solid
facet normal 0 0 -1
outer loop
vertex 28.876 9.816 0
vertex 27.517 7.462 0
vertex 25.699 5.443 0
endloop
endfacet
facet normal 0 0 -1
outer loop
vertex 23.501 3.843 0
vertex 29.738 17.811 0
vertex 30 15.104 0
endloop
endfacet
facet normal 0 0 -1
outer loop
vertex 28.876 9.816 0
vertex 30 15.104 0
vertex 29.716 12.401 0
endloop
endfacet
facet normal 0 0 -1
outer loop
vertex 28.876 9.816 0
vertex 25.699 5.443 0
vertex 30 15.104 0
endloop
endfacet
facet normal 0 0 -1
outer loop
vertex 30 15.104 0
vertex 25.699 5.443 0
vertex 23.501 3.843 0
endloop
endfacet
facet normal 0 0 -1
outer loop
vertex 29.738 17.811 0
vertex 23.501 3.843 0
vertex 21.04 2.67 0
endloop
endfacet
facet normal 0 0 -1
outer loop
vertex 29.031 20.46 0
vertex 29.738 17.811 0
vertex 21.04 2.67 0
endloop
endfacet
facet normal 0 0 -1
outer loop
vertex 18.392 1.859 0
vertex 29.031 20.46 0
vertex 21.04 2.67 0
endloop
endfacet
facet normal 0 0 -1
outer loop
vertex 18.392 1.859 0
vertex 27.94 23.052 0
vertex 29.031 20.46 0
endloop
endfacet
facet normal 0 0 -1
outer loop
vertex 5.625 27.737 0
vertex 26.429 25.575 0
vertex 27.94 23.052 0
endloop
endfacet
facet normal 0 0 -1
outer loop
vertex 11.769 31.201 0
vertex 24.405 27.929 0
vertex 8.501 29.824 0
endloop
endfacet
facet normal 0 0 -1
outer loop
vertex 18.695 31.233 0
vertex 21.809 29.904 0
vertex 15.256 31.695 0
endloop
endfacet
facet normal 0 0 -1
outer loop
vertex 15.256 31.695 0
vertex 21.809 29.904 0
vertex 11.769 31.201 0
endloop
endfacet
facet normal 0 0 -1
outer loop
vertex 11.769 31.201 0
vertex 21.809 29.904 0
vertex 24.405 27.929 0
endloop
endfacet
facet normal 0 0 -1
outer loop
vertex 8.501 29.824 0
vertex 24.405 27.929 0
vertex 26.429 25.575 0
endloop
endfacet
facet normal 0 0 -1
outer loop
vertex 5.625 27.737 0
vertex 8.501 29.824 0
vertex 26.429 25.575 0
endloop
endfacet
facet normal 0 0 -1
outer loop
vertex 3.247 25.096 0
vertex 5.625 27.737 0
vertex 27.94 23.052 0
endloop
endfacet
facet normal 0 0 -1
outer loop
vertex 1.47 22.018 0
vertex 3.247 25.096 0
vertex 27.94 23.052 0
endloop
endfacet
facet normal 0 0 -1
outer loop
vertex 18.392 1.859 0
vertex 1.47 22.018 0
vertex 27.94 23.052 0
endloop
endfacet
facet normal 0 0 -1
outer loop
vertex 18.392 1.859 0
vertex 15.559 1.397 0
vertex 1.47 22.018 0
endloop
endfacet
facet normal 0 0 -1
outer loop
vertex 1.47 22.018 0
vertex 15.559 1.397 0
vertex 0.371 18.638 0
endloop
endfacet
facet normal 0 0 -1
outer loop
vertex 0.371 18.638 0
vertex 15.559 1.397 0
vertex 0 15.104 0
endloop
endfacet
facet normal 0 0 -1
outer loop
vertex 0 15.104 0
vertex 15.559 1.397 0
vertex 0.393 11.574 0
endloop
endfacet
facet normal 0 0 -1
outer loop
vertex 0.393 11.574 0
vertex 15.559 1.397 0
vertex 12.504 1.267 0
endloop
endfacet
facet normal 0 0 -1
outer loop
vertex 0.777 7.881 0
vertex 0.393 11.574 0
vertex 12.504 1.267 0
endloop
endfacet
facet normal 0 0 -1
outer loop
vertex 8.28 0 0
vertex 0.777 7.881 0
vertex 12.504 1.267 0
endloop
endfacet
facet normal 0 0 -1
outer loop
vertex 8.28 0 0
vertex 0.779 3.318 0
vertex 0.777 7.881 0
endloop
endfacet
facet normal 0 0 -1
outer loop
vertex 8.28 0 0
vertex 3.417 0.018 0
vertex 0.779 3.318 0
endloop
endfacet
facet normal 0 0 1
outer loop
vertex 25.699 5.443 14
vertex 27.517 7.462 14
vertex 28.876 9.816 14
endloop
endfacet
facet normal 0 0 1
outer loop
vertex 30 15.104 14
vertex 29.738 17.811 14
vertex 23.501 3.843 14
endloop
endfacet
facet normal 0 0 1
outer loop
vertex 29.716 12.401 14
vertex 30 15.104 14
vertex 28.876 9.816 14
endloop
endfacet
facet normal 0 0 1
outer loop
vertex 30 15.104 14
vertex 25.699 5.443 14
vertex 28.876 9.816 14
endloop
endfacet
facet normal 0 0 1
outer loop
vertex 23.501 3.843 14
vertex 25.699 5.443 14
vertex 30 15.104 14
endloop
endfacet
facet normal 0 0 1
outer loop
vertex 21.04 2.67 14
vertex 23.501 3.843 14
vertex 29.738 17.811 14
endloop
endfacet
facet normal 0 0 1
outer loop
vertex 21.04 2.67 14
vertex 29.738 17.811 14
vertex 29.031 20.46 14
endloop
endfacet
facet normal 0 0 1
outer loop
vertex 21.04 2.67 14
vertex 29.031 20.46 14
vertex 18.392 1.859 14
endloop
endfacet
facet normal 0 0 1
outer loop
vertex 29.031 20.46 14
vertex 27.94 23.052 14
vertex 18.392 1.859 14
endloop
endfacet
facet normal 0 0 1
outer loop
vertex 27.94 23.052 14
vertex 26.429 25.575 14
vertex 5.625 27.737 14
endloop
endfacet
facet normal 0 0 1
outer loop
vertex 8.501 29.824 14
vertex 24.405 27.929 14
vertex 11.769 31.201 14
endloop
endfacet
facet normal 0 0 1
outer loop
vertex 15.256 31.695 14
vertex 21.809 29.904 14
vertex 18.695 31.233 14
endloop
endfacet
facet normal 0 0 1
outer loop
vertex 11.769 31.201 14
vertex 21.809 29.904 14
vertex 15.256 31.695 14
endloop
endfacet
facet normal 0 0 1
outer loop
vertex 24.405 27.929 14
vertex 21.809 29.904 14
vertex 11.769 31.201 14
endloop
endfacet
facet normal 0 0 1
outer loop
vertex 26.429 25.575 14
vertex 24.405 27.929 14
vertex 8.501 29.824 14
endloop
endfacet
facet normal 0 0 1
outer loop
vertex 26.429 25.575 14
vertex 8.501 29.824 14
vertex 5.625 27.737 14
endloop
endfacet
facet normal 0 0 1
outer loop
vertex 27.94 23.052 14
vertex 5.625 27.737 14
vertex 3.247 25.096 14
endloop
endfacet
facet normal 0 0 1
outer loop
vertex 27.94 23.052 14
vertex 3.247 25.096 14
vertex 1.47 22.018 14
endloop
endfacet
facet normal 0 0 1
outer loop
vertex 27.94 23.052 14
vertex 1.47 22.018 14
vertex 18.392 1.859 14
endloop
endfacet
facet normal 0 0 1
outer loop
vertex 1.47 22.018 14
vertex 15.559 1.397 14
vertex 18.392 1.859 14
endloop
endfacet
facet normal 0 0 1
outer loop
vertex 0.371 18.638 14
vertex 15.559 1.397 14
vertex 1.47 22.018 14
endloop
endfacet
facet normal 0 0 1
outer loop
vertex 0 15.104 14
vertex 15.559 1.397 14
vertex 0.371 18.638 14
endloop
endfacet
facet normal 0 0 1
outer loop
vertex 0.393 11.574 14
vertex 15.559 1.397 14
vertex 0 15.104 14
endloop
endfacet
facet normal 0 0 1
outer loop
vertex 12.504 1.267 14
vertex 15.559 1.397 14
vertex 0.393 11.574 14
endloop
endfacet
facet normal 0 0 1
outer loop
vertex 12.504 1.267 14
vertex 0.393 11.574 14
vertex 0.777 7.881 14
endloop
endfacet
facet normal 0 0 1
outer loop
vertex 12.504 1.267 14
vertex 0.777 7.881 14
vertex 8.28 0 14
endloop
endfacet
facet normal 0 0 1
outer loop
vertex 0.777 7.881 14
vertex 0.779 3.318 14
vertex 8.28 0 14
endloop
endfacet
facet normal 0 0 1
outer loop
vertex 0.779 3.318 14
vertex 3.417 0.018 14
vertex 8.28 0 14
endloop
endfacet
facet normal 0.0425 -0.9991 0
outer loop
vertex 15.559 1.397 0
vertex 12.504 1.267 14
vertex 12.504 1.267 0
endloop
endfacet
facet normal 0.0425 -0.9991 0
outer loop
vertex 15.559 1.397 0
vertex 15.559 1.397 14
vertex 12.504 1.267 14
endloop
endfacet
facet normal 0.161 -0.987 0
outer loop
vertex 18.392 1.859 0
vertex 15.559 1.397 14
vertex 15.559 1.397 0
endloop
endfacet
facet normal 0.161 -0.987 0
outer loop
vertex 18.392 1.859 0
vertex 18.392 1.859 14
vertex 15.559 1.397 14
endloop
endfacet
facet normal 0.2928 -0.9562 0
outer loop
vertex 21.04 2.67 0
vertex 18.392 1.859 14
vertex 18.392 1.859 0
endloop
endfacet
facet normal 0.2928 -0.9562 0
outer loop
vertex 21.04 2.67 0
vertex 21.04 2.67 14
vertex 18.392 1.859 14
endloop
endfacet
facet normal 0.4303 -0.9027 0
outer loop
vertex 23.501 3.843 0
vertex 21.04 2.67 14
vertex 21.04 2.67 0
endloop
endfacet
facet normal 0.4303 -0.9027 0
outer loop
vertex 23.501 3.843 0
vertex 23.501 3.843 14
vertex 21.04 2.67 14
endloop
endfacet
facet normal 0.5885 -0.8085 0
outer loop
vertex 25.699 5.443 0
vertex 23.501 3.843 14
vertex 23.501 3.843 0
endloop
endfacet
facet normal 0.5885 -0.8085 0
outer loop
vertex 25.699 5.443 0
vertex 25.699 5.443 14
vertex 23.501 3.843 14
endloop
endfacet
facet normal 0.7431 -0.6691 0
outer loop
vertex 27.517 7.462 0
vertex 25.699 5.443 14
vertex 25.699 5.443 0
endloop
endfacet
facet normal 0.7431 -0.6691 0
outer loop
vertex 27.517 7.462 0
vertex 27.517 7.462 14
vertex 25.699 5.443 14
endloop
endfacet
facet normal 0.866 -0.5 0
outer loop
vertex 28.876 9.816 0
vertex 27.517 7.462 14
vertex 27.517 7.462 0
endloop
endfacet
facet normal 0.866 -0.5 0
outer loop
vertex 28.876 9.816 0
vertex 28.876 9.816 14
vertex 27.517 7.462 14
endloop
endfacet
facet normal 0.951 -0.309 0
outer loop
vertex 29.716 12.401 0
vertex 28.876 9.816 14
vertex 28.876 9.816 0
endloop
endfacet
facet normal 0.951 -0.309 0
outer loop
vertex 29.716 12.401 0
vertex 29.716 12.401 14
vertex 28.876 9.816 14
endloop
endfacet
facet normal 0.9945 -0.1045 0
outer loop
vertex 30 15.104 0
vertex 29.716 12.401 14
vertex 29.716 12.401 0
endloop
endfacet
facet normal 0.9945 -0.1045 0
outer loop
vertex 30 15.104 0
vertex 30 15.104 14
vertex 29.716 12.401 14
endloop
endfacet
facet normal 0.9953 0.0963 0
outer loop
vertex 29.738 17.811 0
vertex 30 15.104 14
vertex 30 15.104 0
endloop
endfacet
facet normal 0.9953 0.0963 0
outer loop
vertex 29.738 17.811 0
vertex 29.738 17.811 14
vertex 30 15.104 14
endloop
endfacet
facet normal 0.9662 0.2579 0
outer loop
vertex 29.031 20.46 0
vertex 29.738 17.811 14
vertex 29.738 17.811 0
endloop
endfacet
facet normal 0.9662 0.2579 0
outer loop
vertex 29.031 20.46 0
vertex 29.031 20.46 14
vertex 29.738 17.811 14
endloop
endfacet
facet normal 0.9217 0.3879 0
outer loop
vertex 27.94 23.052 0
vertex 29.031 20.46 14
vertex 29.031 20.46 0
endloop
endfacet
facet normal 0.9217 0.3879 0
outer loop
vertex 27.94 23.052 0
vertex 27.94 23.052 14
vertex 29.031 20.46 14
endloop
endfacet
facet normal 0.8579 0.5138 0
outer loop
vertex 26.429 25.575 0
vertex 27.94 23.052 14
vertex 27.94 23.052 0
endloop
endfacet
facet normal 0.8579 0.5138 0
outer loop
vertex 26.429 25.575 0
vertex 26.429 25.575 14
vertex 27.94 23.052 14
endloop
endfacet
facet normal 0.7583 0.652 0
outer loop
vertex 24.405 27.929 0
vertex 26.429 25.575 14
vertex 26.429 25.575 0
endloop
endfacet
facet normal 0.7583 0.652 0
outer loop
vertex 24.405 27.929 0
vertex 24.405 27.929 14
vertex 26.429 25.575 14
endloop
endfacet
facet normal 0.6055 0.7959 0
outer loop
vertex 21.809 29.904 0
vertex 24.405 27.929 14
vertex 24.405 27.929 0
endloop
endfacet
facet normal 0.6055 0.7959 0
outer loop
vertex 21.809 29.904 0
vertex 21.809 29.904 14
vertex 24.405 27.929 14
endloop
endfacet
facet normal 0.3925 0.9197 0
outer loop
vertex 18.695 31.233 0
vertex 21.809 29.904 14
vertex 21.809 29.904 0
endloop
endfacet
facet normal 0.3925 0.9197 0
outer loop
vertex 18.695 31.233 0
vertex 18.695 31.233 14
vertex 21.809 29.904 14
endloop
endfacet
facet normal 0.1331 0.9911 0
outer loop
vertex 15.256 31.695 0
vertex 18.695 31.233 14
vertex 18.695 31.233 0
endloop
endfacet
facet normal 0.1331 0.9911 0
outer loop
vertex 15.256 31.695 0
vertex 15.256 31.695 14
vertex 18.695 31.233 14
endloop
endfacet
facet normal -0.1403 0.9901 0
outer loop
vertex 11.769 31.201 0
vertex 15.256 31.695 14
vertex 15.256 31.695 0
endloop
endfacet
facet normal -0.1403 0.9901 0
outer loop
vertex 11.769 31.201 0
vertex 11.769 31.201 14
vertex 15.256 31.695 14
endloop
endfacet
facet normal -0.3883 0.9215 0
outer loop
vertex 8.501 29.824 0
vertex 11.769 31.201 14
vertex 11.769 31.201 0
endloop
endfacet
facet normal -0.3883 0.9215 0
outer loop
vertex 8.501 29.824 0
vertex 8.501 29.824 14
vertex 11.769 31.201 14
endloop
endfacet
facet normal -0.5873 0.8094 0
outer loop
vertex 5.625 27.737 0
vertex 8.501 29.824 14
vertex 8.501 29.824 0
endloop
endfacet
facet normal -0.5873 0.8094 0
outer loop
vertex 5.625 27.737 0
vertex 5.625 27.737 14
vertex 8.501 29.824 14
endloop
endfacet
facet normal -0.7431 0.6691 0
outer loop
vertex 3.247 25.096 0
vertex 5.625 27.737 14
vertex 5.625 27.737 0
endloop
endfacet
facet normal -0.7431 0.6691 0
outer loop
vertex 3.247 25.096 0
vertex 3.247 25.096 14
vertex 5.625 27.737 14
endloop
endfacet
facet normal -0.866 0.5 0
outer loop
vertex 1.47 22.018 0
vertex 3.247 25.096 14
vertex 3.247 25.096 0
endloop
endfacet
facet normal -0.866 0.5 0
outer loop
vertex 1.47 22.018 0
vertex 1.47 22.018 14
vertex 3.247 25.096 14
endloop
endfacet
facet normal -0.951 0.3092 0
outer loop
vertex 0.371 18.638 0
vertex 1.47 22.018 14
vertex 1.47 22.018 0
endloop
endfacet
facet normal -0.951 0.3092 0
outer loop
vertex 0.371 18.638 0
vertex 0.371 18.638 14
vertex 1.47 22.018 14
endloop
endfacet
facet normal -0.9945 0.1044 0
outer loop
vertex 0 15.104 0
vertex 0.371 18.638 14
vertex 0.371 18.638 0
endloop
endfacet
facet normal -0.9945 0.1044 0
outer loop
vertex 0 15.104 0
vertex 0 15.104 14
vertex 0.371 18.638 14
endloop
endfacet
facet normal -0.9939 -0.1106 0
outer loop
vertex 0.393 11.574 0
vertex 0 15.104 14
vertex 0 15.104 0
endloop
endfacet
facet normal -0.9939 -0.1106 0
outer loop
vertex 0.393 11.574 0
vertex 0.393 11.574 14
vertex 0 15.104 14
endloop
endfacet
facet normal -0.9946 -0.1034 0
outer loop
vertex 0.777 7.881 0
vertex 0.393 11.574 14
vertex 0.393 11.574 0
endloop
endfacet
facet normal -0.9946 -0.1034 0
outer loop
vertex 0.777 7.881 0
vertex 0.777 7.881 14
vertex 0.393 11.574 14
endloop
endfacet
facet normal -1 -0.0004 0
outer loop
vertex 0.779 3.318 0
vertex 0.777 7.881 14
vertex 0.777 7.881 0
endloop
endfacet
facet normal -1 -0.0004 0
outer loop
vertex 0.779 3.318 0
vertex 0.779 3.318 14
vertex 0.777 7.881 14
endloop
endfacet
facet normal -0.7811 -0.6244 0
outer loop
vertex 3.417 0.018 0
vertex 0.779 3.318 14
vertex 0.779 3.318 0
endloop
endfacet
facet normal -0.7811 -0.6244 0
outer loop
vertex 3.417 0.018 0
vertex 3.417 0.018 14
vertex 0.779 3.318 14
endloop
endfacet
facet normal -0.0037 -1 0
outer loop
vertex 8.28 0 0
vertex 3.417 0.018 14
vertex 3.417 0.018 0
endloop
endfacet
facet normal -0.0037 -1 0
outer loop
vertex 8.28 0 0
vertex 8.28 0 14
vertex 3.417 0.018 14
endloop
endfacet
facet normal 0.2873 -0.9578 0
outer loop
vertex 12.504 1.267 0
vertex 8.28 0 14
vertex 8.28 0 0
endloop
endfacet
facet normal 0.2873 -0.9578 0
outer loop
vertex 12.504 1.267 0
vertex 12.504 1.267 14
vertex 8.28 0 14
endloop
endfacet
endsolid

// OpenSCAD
$fn = 32;

// ----------------------------------------------------------------------
// Cam disc: base radius 13.0 mm, lift 4.0 mm, 30 profile points
// ----------------------------------------------------------------------

// --- parameters (mm) ---
profile_height = 14;      // extrusion height
profile_points = 30;      // points of the closed outline

profile = [[30, 15.104], [29.738, 17.811], [29.031, 20.46], [27.94, 23.052], [26.429, 25.575], [24.405, 27.929], [21.809, 29.904], [18.695, 31.233], [15.256, 31.695], [11.769, 31.201], [8.501, 29.824], [5.625, 27.737], [3.247, 25.096], [1.47, 22.018], [0.371, 18.638], [0, 15.104], [0.393, 11.574], [0.777, 7.881], [0.779, 3.318], [3.417, 0.018], [8.28, 0], [12.504, 1.267], [15.559, 1.397], [18.392, 1.859], [21.04, 2.67], [23.501, 3.843], [25.699, 5.443], [27.517, 7.462], [28.876, 9.816], [29.716, 12.401]];  // single closed polygon, 30 points, counter clockwise

// --- the one profile operation ---
linear_extrude(height = profile_height) polygon(points = profile);
